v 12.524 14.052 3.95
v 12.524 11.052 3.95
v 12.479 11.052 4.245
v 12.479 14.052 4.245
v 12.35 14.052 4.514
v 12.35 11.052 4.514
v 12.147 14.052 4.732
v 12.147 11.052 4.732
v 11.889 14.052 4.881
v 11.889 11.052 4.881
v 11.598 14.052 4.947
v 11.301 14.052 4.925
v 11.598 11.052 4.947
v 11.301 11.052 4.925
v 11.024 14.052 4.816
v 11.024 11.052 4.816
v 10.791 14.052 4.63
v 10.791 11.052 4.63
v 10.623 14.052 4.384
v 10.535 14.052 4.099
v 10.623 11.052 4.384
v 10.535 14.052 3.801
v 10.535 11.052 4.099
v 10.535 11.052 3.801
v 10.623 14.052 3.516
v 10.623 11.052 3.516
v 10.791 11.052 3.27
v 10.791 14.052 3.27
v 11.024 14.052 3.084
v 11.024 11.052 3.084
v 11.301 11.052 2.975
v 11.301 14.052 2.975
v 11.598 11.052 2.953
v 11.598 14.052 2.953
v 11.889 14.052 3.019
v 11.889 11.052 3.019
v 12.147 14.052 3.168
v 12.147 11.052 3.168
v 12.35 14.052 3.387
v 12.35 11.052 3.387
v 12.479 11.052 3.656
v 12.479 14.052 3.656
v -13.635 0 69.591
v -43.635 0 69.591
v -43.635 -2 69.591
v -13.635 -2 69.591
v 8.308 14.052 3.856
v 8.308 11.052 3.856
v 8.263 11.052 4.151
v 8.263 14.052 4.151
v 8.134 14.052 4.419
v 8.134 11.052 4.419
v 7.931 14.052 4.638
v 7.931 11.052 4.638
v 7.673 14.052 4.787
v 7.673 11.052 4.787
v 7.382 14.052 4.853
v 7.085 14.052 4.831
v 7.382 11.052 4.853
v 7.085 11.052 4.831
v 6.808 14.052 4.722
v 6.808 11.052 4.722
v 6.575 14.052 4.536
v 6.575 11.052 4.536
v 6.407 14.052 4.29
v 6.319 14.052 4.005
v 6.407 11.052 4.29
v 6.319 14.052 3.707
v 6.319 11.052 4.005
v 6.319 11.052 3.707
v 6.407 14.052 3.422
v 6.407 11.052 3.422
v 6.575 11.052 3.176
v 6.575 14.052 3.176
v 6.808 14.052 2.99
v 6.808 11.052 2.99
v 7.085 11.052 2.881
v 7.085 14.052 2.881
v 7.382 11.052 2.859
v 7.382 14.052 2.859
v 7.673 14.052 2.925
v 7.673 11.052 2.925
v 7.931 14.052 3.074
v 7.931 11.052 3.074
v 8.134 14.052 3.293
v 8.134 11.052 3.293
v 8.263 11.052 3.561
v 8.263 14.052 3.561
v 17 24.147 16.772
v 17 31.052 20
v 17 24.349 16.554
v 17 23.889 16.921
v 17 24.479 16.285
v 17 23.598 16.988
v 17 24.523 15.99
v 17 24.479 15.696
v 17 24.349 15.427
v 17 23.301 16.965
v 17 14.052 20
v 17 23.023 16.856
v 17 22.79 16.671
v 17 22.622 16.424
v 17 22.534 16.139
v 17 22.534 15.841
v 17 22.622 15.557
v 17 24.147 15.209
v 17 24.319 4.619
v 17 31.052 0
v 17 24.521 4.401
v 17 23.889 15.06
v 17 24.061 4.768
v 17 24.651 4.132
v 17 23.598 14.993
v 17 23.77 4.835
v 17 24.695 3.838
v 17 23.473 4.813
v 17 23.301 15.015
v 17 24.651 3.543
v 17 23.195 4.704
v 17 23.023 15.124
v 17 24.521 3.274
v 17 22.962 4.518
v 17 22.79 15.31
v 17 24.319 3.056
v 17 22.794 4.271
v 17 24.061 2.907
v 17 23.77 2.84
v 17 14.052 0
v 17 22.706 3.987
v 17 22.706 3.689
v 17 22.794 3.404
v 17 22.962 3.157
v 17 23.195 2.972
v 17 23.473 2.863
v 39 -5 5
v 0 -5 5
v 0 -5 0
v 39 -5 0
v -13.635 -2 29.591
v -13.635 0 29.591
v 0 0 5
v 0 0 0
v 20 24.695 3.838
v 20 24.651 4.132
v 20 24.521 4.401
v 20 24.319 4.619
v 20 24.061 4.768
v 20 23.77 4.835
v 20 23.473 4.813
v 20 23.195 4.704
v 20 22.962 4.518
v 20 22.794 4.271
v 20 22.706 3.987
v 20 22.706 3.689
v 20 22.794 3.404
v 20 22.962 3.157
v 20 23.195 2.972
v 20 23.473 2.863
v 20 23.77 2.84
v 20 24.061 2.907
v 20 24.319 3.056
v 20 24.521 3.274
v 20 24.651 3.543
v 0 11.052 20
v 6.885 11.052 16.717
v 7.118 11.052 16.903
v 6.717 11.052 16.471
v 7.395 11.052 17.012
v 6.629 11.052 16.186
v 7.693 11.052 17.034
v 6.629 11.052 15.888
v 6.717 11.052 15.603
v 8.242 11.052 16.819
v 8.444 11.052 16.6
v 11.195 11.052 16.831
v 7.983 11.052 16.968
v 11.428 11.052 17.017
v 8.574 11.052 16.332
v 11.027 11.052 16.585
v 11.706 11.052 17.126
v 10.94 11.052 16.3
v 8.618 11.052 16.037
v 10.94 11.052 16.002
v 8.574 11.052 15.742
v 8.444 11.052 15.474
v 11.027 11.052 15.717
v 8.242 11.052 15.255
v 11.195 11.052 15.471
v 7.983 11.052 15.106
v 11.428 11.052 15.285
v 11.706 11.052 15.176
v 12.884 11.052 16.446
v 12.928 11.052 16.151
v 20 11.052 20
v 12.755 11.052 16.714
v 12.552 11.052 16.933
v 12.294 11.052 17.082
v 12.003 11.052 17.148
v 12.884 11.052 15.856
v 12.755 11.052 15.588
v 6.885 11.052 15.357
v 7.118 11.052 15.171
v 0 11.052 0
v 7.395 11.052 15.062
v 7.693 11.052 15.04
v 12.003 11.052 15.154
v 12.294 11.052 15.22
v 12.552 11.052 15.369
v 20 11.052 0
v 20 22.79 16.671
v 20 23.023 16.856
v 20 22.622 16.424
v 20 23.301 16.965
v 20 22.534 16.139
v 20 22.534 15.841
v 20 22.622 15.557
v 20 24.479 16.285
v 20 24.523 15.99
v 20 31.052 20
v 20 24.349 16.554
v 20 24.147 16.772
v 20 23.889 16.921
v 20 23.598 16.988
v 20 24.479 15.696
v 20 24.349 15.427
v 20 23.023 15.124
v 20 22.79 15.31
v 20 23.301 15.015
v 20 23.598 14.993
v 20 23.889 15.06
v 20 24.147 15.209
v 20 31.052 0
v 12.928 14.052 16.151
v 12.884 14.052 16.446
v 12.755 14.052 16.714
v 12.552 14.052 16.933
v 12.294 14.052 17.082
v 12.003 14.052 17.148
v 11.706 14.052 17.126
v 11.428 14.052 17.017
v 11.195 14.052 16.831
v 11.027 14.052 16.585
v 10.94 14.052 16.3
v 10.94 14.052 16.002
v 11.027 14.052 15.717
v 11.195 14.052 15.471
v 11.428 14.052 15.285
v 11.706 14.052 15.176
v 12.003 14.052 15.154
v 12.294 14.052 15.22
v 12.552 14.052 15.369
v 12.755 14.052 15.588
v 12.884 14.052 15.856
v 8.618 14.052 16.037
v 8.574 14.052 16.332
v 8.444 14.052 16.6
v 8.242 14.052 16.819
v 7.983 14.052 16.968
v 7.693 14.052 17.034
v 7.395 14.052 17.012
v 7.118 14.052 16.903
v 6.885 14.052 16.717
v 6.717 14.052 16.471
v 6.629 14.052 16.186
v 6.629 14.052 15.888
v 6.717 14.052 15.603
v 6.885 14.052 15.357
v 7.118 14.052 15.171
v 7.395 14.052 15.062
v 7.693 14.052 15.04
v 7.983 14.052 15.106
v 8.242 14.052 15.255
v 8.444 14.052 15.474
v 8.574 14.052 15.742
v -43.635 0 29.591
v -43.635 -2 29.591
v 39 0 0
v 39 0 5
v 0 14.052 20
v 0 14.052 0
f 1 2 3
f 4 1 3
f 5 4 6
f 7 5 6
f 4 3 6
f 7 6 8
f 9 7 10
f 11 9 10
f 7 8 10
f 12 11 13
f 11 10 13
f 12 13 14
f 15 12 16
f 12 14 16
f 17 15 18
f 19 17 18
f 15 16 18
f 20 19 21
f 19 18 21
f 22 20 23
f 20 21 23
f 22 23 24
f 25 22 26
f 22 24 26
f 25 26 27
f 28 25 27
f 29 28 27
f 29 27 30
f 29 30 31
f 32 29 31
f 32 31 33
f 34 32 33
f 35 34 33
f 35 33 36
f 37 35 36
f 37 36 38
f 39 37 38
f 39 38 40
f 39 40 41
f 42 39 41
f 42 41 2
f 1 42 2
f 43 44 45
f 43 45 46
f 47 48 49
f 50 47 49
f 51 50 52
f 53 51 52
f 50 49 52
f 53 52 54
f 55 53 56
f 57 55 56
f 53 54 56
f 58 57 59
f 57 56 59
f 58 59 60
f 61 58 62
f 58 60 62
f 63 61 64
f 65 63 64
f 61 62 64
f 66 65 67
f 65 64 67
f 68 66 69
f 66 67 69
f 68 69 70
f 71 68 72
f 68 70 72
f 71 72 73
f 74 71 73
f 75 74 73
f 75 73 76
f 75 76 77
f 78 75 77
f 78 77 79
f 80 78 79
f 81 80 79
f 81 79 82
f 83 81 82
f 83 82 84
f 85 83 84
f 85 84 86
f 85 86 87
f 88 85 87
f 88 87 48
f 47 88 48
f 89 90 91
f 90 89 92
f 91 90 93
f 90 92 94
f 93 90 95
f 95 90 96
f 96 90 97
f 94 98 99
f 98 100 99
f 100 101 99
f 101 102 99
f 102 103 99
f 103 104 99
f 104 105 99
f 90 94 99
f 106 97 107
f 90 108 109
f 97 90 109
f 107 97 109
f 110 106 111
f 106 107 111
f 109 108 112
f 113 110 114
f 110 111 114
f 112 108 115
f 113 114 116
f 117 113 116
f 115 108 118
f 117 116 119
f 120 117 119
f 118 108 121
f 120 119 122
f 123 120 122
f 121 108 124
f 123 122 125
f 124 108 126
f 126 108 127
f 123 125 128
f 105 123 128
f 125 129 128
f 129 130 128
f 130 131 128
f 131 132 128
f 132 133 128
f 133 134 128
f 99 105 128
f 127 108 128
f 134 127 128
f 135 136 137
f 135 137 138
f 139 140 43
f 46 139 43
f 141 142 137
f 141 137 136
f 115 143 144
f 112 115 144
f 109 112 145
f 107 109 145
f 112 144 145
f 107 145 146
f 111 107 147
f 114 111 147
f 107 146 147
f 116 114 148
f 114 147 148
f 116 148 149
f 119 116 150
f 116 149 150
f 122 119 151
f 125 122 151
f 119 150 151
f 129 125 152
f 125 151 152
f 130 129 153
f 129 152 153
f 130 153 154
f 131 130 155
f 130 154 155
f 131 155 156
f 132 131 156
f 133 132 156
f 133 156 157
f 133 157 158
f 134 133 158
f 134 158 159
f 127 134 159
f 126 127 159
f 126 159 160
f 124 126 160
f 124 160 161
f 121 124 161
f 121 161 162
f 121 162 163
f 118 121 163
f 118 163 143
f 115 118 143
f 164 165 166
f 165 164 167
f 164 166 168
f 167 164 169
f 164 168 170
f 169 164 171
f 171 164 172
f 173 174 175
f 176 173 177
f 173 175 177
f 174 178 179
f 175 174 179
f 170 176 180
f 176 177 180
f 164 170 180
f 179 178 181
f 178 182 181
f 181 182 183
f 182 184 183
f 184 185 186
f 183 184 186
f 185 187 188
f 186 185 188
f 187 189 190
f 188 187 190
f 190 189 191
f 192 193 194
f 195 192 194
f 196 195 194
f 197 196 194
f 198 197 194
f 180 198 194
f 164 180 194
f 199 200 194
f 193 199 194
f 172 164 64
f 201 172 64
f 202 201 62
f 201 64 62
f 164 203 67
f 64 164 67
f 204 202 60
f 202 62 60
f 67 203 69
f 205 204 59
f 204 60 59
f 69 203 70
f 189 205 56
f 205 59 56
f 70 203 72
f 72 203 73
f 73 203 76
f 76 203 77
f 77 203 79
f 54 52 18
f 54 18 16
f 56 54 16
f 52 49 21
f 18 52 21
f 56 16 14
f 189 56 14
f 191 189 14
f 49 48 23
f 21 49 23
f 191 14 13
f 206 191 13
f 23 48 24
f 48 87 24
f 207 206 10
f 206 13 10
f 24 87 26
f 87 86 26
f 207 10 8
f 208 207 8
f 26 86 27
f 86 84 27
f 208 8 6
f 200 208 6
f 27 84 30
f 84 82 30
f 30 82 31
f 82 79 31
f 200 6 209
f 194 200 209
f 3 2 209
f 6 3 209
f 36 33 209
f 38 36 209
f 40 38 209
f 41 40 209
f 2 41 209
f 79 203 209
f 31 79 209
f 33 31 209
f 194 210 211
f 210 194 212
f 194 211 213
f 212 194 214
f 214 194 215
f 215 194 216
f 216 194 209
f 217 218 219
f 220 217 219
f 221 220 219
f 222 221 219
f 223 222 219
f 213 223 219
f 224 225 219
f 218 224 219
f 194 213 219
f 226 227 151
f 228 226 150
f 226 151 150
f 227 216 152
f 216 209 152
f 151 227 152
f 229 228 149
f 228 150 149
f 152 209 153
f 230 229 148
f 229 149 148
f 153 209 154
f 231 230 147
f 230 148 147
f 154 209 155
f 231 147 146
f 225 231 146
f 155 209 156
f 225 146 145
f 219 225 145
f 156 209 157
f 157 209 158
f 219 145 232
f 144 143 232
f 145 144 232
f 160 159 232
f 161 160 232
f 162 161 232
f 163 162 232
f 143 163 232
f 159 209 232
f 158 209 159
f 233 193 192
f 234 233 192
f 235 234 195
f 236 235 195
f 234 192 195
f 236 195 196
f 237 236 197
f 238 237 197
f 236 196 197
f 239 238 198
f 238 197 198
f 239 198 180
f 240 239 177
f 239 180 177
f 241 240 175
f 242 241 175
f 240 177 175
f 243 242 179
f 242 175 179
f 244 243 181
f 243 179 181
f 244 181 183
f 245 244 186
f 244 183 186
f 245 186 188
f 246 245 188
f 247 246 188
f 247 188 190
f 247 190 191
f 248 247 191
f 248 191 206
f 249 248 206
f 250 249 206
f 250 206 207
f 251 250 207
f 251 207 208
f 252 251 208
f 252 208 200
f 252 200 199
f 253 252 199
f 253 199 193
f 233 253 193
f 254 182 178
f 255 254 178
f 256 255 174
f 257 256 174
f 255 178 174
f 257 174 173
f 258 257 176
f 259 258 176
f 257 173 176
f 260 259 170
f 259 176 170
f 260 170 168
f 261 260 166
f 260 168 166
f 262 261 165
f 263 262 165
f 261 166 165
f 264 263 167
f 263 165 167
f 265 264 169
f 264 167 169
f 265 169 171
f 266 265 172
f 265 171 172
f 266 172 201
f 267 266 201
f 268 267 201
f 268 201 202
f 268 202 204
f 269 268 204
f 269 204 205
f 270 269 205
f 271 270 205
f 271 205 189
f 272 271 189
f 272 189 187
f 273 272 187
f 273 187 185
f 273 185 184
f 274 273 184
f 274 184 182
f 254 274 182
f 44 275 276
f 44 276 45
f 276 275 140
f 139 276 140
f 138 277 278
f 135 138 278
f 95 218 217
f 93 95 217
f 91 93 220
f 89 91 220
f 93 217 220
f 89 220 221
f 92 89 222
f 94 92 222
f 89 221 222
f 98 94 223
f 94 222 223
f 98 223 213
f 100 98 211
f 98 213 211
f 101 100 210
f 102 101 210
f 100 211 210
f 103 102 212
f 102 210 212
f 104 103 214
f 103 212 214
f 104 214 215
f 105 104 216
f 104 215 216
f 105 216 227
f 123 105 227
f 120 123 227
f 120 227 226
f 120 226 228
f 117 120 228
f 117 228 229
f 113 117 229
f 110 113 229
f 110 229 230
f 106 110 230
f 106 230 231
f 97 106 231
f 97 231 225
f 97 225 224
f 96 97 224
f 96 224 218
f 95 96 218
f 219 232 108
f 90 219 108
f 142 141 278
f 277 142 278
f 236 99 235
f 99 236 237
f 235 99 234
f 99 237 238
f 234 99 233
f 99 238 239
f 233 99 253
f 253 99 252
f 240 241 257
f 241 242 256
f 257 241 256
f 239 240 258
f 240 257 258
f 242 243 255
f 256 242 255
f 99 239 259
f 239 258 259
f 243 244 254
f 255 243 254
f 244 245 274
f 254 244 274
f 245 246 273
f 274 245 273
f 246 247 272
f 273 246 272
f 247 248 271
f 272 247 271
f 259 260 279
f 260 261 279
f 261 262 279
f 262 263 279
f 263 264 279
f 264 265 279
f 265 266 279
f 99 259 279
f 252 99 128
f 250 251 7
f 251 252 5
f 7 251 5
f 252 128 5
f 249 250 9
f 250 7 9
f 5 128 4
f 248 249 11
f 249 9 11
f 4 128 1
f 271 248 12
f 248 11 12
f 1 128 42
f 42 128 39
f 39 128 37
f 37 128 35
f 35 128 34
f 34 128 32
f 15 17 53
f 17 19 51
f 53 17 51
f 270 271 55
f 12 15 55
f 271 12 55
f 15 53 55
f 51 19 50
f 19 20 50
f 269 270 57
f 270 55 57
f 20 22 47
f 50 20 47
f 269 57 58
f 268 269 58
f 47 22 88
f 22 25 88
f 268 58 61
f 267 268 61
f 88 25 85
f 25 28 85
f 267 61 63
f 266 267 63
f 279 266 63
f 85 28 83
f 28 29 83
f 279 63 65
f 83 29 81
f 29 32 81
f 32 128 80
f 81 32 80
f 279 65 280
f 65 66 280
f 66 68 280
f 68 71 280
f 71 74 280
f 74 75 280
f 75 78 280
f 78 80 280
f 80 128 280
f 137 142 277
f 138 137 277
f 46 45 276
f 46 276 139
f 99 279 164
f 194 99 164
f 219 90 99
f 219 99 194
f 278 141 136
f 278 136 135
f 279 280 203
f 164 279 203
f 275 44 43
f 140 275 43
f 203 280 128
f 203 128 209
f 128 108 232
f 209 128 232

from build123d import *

# Parameters (mm, degrees)
F0_W           = 39
F0_H           = 5
F1_DEPTH       = 5
F2_W           = 30
F2_H           = 40
F3_DEPTH       = 2
F5_DEPTH       = 20
F8_D           = 2
F8_DEPTH       = 5
F8_TIP         = 0.600860619
F8_ON_F6_D     = 2
F8_ON_F6_DEPTH = 5
F8_ON_F6_TIP   = 0.600860619


with BuildPart() as f1:
    # F0 (on Front) → F1 (new body)
    with BuildSketch(Plane.XZ):
        with Locations((19.5, 2.5)):
            Rectangle(F0_W, F0_H)
    extrude(amount=F1_DEPTH)


with BuildPart() as f3:
    # F2 (on Front) → F3 (new body)
    with BuildSketch(Plane.XZ):
        with Locations((-28.6348711327, 49.5908727205)):
            Rectangle(F2_W, F2_H)
    extrude(amount=F3_DEPTH)


with BuildPart() as f5:
    # F4 (on Top) → F5 (new body)
    with BuildSketch(Plane.XY):
        Polygon((17, 14.0518931171), (0, 14.0518931171), (0, 11.0518931171), (20, 11.0518931171), (20, 31.0518931171), (17, 31.0518931171), align=None)
    extrude(amount=F5_DEPTH)

    # F8
    with Locations(Plane(origin=(0, 14.0518931171, 0), x_dir=(-1, 0, 0), z_dir=(0, 1, 0))):
        with Locations((-7.3076039553, 3.8561229594), (-11.5236490965, 3.9502684958), (-11.928435415, 16.150822863), (-7.6180133037, 16.0369295627)):
            Hole(F8_D / 2, depth=F8_DEPTH)
            with Locations((0, 0, -(F8_DEPTH + F8_TIP / 2))):  # 118° drill point
                Cone(0, F8_D / 2, F8_TIP, mode=Mode.SUBTRACT)

    # F8 on F6
    with Locations(Plane(origin=(17, 0, 0), x_dir=(0, -1, 0), z_dir=(-1, 0, 0))):
        with Locations((-23.5232319683, 15.9904174507), (-23.6952062696, 3.8376019802)):
            Hole(F8_ON_F6_D / 2, depth=F8_ON_F6_DEPTH)
            with Locations((0, 0, -(F8_ON_F6_DEPTH + F8_ON_F6_TIP / 2))):  # 118° drill point
                Cone(0, F8_ON_F6_D / 2, F8_ON_F6_TIP, mode=Mode.SUBTRACT)


solid = Compound([f1.part, f3.part, f5.part])
